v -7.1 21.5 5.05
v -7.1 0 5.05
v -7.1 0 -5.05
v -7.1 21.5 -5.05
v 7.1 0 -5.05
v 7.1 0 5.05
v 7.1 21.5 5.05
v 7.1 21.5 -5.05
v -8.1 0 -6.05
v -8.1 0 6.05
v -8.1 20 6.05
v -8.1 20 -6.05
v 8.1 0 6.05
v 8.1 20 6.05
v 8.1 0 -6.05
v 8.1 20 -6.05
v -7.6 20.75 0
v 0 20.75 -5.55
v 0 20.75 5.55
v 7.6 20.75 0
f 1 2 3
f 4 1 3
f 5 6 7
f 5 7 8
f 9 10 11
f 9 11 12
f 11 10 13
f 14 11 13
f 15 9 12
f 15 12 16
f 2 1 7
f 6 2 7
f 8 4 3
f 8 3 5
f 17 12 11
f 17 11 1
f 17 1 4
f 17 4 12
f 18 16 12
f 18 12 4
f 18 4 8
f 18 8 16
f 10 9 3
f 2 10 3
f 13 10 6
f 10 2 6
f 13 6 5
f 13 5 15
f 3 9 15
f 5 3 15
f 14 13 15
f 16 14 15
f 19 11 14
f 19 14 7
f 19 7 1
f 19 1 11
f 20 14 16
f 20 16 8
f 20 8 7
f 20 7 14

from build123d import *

# Parameters (mm, degrees)
SKETCH1_W           = 16.2
SKETCH1_H           = 12.1
BOSS_EXTRUDE1_DEPTH = 20
SKETCH2_2_W         = 14.2
SKETCH2_2_H         = 10.1
CUT_EXTRUDE1_DEPTH  = 24.75841962


with BuildPart() as part:
    # Sketch1 → Boss-Extrude1 (new body)
    with BuildSketch(Plane(origin=(0, 0, 0), x_dir=(1, 0, 0), z_dir=(0, 1, 0))):
        Rectangle(SKETCH1_W, SKETCH1_H)
    extrude(amount=BOSS_EXTRUDE1_DEPTH)

    # Sketch2 → section 1 of loft1
    with BuildSketch(Plane(origin=(0, 21.5, 0), x_dir=(1, 0, 0), z_dir=(0, 1, 0)), mode=Mode.PRIVATE) as loft1_s1:
        with BuildLine():
            Line((-7.1, -5.05), (7.1, -5.05))
            Line((7.1, -5.05), (7.1, 5.05))
            Line((7.1, 5.05), (-7.1, 5.05))
            Line((-7.1, 5.05), (-7.1, -5.05))
        make_face()
    # loft from a face of the part (loft1)
    loft([part.faces().sort_by_distance((0, 20, 0))[0], loft1_s1.sketch])

    # Sketch2<2> → Cut-Extrude1 (cut, through all)
    with BuildSketch(Plane(origin=(0, 21.5, 0), x_dir=(1, 0, 0), z_dir=(0, 1, 0))):
        Rectangle(SKETCH2_2_W, SKETCH2_2_H)
    extrude(amount=-CUT_EXTRUDE1_DEPTH, mode=Mode.SUBTRACT)


solid = part.part
